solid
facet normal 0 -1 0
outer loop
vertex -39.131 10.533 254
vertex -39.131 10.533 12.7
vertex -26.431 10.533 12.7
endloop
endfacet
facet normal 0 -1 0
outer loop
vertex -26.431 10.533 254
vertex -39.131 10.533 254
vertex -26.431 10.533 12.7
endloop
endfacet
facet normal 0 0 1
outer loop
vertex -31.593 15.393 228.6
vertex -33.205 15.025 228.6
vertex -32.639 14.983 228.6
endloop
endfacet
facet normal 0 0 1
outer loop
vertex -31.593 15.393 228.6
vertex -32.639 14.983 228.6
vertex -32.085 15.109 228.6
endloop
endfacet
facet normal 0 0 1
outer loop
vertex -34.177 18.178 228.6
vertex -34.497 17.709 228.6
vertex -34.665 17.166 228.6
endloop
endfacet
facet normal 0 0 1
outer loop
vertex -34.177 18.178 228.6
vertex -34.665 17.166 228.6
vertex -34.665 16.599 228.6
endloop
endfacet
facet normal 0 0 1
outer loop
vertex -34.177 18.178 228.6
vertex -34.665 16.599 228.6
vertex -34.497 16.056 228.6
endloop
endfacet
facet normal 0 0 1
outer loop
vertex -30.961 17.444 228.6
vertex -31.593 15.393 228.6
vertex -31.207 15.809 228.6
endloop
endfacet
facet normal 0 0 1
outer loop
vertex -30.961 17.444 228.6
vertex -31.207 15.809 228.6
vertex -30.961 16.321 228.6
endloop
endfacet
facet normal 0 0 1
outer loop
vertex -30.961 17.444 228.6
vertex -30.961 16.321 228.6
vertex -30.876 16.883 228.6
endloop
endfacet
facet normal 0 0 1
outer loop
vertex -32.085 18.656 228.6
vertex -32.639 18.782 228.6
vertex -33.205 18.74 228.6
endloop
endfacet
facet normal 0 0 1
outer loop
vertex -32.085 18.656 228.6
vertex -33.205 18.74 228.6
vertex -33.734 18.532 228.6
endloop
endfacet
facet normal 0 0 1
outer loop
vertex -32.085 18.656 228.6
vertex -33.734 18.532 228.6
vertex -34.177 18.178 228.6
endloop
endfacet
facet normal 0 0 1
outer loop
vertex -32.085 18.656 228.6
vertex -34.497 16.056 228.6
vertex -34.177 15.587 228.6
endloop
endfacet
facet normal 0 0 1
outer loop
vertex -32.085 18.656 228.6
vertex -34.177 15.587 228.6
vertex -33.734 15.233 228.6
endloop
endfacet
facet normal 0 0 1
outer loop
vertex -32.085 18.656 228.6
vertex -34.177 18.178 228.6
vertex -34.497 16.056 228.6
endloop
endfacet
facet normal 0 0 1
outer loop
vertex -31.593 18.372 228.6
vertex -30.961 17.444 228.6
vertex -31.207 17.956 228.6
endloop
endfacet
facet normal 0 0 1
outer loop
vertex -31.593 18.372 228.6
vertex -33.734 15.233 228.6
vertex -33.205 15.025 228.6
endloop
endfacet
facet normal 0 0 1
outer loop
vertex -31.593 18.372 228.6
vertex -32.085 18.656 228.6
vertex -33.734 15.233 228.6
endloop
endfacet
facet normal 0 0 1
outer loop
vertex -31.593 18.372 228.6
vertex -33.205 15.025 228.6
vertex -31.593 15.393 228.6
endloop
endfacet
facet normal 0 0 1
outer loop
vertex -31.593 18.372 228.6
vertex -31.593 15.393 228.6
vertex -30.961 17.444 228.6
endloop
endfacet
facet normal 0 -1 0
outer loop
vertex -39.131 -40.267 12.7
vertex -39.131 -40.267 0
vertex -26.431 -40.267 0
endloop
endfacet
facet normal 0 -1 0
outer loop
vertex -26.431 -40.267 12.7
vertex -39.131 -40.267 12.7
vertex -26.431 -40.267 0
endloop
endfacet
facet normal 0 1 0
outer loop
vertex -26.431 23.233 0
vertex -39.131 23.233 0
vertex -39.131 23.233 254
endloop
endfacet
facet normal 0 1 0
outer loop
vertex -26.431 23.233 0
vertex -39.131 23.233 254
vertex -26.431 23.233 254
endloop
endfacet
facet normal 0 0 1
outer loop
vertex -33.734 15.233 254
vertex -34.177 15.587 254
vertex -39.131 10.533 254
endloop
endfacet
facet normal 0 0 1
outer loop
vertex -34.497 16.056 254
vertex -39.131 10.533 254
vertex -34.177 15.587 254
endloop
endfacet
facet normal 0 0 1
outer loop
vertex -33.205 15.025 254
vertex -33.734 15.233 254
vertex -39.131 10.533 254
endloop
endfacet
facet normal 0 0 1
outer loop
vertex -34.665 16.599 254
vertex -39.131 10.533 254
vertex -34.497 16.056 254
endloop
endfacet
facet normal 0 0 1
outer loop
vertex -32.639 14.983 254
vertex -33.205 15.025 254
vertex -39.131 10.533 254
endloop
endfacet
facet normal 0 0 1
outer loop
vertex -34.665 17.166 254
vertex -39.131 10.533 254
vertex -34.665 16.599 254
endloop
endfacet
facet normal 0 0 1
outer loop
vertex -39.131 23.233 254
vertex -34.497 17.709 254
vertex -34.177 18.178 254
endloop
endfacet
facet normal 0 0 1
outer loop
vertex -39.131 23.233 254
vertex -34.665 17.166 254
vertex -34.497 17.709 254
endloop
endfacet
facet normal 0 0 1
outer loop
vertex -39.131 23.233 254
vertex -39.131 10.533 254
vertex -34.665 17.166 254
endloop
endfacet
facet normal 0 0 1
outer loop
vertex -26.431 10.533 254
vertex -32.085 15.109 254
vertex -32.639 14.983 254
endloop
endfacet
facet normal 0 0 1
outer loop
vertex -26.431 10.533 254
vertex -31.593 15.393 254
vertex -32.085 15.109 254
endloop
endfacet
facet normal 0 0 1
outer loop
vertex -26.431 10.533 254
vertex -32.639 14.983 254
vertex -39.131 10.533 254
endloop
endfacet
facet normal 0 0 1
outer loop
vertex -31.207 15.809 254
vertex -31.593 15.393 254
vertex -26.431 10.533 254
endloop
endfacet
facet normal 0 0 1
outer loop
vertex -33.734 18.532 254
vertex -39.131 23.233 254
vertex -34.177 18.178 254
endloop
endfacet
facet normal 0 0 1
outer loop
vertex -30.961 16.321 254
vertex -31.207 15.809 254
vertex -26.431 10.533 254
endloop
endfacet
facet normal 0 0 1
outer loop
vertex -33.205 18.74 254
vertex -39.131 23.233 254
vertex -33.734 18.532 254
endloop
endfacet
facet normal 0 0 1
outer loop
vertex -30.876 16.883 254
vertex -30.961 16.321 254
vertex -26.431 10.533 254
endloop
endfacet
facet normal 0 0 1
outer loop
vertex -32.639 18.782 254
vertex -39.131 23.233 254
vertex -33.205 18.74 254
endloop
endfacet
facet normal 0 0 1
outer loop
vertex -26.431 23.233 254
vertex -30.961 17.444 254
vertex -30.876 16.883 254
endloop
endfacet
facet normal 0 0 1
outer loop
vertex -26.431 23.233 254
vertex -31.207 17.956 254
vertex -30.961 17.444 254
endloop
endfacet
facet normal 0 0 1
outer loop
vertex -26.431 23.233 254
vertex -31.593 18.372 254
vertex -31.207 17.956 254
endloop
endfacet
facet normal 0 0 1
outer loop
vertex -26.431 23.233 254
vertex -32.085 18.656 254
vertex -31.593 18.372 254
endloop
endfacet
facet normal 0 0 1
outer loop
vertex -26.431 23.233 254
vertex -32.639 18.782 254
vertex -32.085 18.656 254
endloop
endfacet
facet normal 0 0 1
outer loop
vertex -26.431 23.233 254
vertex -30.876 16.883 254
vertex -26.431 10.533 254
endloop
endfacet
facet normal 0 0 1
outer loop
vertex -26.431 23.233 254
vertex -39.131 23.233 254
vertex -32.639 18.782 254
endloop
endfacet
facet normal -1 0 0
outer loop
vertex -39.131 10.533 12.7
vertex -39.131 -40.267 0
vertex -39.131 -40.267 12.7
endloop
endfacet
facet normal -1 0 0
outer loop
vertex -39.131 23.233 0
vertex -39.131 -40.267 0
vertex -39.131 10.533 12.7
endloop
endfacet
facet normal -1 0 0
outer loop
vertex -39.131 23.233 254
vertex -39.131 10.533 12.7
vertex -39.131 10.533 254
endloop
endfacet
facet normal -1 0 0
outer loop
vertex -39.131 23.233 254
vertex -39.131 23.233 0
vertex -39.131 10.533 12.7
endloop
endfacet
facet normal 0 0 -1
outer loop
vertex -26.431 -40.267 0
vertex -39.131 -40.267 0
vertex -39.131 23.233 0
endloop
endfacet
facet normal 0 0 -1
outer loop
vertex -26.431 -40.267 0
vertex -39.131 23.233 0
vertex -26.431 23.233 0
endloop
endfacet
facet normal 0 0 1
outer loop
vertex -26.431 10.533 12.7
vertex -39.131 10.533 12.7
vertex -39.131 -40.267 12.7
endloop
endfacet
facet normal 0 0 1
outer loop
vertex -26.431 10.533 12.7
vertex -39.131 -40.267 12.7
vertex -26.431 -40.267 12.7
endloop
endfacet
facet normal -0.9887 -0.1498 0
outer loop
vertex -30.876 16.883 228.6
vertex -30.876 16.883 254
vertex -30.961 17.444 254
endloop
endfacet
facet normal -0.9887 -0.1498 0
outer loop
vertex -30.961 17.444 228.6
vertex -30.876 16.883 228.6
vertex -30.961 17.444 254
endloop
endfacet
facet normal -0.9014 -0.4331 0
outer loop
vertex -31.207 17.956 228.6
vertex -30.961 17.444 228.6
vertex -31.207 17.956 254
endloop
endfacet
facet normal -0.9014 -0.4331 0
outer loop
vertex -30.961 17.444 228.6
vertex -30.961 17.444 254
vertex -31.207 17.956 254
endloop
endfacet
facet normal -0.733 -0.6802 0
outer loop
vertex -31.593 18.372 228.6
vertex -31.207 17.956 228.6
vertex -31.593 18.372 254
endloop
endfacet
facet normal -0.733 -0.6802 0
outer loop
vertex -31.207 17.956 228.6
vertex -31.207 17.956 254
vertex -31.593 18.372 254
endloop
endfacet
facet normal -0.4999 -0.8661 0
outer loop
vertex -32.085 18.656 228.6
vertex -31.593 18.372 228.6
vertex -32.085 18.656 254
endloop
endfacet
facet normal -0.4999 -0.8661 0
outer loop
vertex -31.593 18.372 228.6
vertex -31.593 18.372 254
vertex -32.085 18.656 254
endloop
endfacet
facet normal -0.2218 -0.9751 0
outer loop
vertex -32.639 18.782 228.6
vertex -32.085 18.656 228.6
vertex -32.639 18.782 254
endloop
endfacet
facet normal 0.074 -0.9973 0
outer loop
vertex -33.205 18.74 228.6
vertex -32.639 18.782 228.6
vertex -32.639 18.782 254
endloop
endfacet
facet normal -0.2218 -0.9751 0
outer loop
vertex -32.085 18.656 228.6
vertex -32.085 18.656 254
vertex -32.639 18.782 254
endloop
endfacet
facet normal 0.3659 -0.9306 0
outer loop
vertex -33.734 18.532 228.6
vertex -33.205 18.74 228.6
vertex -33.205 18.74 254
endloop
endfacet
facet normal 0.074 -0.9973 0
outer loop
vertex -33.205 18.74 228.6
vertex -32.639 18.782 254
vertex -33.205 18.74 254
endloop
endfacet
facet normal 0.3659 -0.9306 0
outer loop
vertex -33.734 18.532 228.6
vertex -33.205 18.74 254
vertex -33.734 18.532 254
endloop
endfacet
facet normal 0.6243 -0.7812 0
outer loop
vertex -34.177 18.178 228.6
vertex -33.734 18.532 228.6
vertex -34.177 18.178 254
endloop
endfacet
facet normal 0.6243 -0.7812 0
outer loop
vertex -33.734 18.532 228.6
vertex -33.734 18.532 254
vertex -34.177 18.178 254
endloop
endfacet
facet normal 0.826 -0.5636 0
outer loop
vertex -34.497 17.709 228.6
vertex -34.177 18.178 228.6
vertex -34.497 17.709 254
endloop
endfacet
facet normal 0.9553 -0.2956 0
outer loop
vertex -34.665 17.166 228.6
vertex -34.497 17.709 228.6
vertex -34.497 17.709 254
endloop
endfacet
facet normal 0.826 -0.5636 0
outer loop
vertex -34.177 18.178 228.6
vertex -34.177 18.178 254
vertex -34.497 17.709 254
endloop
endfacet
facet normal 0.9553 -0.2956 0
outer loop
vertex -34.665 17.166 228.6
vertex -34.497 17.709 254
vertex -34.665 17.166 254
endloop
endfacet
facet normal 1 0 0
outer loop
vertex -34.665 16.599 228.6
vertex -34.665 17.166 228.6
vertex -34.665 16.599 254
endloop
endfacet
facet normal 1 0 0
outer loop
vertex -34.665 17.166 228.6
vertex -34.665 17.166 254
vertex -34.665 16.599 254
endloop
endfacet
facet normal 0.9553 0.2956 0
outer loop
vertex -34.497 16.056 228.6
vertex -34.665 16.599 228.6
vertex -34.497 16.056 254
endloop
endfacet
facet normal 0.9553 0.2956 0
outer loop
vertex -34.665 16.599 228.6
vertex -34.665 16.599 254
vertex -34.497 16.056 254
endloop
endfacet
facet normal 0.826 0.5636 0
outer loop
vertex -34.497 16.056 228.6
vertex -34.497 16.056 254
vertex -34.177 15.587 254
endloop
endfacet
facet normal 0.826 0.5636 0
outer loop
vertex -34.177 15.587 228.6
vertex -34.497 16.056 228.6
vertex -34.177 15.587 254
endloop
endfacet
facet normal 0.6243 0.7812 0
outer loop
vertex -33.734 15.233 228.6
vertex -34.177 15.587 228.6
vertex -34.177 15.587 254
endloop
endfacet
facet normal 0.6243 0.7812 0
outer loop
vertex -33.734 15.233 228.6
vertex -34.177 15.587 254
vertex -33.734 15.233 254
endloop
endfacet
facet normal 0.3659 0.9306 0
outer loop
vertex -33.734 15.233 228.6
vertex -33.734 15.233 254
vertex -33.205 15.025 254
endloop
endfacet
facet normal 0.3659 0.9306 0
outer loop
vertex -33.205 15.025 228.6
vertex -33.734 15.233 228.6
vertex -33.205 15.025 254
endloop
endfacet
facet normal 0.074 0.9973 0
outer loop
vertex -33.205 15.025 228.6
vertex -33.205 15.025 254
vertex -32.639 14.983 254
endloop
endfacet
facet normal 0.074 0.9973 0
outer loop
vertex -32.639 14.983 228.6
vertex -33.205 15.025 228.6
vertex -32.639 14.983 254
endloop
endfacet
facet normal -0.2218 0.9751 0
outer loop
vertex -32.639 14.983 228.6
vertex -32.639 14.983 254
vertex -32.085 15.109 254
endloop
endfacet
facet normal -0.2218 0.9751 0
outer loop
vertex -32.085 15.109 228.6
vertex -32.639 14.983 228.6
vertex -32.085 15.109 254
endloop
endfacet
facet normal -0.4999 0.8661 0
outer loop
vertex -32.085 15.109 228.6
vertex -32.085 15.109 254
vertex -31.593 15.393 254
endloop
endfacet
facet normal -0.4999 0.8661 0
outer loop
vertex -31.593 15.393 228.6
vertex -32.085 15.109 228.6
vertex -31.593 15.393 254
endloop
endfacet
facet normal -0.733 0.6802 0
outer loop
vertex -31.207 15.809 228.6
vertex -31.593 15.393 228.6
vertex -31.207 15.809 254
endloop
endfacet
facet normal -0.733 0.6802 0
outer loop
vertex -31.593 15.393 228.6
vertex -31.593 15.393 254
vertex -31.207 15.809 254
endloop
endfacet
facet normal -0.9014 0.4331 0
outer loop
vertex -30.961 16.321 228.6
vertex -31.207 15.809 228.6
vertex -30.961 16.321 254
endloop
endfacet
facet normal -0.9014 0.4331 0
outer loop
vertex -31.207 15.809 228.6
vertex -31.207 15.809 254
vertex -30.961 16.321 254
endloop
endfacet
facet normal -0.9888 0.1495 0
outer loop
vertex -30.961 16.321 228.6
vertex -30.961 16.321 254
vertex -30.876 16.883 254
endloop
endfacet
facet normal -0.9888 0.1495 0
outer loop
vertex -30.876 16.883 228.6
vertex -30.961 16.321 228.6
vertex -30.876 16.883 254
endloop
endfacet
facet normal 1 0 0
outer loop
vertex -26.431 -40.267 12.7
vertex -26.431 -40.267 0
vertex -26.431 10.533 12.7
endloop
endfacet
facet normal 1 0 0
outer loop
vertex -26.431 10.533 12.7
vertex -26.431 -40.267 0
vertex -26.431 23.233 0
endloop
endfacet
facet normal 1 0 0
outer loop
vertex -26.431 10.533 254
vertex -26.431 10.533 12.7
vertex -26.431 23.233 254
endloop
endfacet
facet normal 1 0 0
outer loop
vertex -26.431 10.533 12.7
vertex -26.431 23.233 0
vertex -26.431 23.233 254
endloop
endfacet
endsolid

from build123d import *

# Parameters (mm, degrees)
F0_W      = 6.35
F0_H      = 203.5342199714
F1_DEPTH  = 101.6
F2_W      = 101.6
F2_H      = 6.35
F3_DEPTH  = 25.4
F5_W      = 12.7
F5_H      = 12.7
F6_DEPTH  = 254
F7_R      = 1.905
F8_DEPTH  = 25.4
F9_W      = 12.7
F9_H      = 12.7
F10_DEPTH = 50.8


with BuildPart() as f1:
    # F0 (on Right) → F1 (new body)
    with BuildSketch(Plane.YZ):
        Polygon((-3.0652988178, -75.2811529749), (-98.3152988178, -75.2811529749), (-98.3152988178, -81.6311529749), (3.2847011822, -81.6311529749), (3.2847011822, -75.2811529749), align=None)
        with Locations((0.1097011822, 26.4859570108)):
            Rectangle(F0_W, F0_H)
    extrude(amount=F1_DEPTH)

    # F2 (on face) → F3 (join)
    with BuildSketch(Plane.XY.offset(-75.2811529749)):
        with Locations((50.8, -95.1402988178)):
            Rectangle(F2_W, F2_H)
    extrude(amount=F3_DEPTH)


with BuildPart() as f6:
    # F5 (on Top) → F6 (new body)
    with BuildSketch(Plane.XY):
        with Locations((-32.7810319141, 16.882541026)):
            Rectangle(F5_W, F5_H)
    extrude(amount=F6_DEPTH)

    # F7 (on face) → F8 (cut)
    with BuildSketch(Plane.XY.offset(254)):
        with Locations((-32.7810319141, 16.882541026)):
            Circle(F7_R)
    extrude(amount=-F8_DEPTH, mode=Mode.SUBTRACT)

    # F9 (on face) → F10 (join)
    with BuildSketch(Plane.XZ.offset(-10.532541026)):
        with Locations((-32.7810319141, 6.35)):
            Rectangle(F9_W, F9_H)
    extrude(amount=F10_DEPTH)


solid = f6.part
